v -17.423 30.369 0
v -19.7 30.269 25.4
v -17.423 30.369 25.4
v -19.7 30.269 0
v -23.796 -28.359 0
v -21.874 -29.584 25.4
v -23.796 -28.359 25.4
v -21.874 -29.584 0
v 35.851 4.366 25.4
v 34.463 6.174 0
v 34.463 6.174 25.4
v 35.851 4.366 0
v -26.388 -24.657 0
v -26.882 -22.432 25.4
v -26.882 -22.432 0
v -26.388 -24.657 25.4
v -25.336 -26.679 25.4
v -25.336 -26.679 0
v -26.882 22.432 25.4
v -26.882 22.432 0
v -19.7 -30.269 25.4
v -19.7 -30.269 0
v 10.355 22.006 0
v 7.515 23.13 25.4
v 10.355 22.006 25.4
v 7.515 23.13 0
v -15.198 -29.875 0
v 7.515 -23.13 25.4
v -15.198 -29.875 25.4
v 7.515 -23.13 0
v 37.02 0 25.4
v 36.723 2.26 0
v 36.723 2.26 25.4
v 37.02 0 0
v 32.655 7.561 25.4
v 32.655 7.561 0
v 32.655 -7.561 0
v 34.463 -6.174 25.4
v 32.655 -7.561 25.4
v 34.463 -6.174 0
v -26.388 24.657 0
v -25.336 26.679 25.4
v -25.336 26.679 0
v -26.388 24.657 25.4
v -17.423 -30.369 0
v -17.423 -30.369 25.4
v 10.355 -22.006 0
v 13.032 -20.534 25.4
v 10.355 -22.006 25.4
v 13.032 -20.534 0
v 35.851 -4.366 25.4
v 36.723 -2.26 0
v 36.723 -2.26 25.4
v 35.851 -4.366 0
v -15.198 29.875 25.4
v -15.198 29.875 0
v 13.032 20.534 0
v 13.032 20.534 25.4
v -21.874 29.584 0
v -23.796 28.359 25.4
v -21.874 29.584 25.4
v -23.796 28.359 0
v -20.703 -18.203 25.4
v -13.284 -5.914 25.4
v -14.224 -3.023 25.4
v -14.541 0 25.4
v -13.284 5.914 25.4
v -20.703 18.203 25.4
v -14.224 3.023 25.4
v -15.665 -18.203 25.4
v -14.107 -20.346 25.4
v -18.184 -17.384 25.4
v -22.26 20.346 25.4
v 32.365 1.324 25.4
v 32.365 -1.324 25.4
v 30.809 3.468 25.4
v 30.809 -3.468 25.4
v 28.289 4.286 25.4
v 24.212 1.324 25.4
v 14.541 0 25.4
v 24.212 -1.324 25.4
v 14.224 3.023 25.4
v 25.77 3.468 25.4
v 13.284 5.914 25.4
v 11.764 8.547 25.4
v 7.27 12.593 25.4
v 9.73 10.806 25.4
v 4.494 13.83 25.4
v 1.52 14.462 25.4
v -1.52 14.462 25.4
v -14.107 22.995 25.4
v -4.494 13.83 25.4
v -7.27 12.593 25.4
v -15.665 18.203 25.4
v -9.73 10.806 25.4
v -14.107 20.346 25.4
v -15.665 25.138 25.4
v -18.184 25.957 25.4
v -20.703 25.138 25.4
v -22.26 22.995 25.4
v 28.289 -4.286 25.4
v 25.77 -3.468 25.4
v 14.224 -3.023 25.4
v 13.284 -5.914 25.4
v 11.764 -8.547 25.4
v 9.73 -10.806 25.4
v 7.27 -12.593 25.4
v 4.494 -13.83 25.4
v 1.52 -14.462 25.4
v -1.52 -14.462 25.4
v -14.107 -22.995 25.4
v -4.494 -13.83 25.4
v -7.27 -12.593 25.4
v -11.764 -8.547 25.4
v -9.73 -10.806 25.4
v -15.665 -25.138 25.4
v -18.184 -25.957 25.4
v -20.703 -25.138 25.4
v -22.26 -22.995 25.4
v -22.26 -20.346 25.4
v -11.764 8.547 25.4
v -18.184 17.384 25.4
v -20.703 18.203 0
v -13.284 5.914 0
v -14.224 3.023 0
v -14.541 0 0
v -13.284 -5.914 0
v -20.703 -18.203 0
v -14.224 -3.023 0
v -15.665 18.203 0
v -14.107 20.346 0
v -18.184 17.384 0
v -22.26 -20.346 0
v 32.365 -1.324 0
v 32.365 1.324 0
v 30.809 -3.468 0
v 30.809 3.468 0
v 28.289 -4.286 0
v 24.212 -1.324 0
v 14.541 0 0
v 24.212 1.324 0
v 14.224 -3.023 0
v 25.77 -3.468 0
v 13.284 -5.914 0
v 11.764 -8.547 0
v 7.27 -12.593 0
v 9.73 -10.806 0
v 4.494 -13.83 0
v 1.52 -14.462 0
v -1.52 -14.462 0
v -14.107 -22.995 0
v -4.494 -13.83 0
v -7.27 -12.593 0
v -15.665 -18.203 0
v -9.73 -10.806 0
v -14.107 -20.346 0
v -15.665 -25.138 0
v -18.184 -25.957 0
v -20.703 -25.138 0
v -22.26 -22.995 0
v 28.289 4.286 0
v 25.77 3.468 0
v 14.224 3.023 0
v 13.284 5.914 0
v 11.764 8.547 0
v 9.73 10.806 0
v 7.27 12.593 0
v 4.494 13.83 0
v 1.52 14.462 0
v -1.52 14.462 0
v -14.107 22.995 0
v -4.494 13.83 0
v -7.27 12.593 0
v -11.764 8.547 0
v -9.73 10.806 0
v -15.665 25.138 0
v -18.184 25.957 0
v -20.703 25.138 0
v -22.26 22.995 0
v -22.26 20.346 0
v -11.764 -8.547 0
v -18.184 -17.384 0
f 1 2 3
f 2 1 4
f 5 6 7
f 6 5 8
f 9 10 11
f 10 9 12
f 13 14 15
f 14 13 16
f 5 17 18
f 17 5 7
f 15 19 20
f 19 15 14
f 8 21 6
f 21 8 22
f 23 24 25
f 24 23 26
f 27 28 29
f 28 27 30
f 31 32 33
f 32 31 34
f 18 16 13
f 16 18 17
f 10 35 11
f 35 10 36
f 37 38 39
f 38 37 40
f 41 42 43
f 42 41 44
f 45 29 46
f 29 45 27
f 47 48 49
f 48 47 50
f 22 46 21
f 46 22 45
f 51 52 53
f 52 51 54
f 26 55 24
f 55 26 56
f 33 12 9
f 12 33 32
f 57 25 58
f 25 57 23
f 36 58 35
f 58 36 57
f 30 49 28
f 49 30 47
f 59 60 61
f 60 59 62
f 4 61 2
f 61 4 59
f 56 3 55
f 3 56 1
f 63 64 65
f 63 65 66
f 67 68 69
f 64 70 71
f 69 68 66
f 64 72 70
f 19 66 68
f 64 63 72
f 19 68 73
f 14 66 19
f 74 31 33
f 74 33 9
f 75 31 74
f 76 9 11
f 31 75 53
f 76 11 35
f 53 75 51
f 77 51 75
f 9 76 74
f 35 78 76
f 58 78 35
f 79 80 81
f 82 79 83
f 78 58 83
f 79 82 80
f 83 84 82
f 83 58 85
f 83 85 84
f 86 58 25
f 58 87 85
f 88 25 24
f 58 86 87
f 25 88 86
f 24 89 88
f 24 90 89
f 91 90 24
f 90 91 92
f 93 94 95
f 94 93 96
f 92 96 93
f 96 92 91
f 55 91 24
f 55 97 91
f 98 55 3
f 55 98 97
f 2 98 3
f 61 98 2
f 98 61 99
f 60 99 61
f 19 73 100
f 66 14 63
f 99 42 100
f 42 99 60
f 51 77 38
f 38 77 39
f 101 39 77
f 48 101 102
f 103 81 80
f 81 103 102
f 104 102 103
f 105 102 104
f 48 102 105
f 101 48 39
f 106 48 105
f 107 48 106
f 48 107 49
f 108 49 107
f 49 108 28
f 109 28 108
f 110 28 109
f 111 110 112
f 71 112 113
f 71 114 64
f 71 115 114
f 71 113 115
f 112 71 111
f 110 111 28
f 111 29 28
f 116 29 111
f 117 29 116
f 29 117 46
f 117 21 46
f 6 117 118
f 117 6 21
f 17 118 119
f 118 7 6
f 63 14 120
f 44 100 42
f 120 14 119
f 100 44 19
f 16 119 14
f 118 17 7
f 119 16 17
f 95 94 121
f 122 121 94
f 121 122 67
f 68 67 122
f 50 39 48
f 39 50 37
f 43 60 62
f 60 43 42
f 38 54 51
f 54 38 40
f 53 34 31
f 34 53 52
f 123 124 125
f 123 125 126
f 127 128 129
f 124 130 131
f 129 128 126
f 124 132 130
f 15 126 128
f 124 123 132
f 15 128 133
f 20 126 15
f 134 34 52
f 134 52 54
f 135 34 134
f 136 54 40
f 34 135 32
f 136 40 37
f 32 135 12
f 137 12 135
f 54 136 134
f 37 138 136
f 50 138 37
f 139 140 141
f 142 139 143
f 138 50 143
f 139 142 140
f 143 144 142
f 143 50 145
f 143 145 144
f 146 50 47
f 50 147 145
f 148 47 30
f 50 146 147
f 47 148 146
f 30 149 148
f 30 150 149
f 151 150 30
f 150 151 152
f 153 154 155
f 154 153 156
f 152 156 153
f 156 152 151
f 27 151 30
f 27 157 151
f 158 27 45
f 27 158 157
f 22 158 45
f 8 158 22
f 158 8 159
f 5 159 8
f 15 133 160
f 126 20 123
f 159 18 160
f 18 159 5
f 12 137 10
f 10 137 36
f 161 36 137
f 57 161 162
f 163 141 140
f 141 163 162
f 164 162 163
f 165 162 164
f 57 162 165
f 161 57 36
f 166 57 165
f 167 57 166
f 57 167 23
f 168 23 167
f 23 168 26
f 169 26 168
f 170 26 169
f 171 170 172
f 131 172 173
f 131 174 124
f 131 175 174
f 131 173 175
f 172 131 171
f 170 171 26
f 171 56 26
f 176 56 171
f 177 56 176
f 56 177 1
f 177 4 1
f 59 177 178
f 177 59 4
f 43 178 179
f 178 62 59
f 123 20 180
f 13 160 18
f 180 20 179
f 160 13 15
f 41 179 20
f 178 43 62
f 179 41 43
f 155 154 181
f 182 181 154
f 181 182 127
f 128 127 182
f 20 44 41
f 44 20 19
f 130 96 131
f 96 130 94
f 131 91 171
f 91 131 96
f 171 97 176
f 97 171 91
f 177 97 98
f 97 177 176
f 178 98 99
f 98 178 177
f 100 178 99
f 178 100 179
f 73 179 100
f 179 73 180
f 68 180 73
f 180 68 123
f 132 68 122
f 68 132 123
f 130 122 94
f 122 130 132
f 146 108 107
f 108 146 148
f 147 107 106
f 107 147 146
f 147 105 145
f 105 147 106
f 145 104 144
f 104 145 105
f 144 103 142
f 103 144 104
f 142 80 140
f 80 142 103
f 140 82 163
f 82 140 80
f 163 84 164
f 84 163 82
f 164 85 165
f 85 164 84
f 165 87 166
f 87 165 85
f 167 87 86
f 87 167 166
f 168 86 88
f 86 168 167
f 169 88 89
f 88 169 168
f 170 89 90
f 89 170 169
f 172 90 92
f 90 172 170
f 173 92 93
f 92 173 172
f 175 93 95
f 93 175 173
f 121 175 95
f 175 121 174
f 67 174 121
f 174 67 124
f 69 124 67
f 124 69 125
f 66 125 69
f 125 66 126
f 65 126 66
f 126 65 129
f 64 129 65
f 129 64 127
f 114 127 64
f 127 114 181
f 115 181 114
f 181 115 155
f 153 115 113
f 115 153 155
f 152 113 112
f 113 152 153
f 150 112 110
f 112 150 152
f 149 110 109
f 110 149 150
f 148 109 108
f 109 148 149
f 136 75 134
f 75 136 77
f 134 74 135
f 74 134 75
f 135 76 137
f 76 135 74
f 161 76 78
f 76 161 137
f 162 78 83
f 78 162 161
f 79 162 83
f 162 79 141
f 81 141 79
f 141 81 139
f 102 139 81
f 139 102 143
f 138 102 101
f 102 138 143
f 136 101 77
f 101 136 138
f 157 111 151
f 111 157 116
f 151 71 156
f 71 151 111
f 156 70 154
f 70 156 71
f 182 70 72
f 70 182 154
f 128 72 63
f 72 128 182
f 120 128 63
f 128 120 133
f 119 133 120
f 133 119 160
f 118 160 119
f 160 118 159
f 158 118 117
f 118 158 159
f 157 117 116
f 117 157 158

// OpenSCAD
// file: Vitamins/Rod.scad
RodDiameter       = 1;
RodRadius         = 2;
RodClearanceSnug  = 3;
RodClearanceLoose = 4;
RodFn             = 5;

RodOneEighthInch = [
  [RodDiameter, 1/8],
  [RodRadius, 1/8/2],
  [RodClearanceSnug, 0.02],
  [RodClearanceLoose, 0.03],
  [RodFn, 8]
];

RodOneQuarterInch = [
  [RodDiameter,       1/4],
  [RodRadius,         1/4/2],
  [RodClearanceSnug,  0.027],
  [RodClearanceLoose, 0.035],
  [RodFn,             8]
];

RodFiveSixteenthInch = [
  [RodDiameter,       5/16],
  [RodRadius,         5/16/2],
  [RodClearanceSnug,  0.025],
  [RodClearanceLoose, 0.025],
  [RodFn,             10]
];

RodThreeQuarterInchTubing = [
  [RodDiameter,       0.758],
  [RodRadius,         0.758/2],
  [RodClearanceSnug,  0.023],
  [RodClearanceLoose, 0.029],
  [RodFn,             30]
];

/**
 * Lookup the diameter of a rod.
 * @param rod The rod to lookup.
 * @param clearance The RodClearance to use.
 */
function RodDiameter(rod=undef, clearance=undef)
           = lookup(RodDiameter, rod)
          + (clearance != undef ? lookup(clearance, rod) : 0);

/**
 * Lookup the radius of a rod.
 * @param rod The rod to lookup.
 * @param clearance The RodClearance to use.
 */
function RodRadius(rod, clearance=undef) = RodDiameter(rod, clearance)/2;

/**
 * Lookup the $fn value for a rod, optionally overriding it
 * @param rod The rod to lookup.
 * @param $fn Override the RodFn. If defined, this will be the result. (convenience arg)
 **/
function RodFn(rod, $fn=undef) = ($fn == undef) ? lookup(RodFn, rod) : $fn;

/**
 * A 2D rod (circle).
 * @param rod The rod to render.
 * @param clearance The RodClearance to use.
 * @param $fn Override the RodFn value of the rod.
 */
module Rod2d(rod=RodOneQuarterInch, clearance=undef, $fn=undef) {
  circle(r=RodRadius(rod, clearance),
         $fn=RodFn(rod, $fn));
}


module Rod(rod=RodOneQuarterInch, length=1, clearance=undef, center=false, $fn=undef) {
  render(convexity=1)
  linear_extrude(height=length, center=center)
  Rod2d(rod, clearance, $fn=$fn);
}

// 1/8" Rod
1_8_rod_d                = 1/8;
1_8_rod_r                = 1_8_rod_d/2;
1_8_rod_clearance        = 0.02;
1_8_rod_clearance_loose  = 0.03;

// 1/4" Rod
1_4_rod_d                = 1/4;
1_4_rod_r                = 1_4_rod_d/2;
1_4_rod_clearance        = 0.01;
1_4_rod_clearance_loose  = 0.015;
1_4_rod_collar_d         = 1/22;
1_4_rod_collar_width     = 0.27;
1_4_rod_collar_clearance = 0.0; // TODO

// 5/16" Rod
5_16_rod_d                = 5/16;
5_16_rod_r                = 5_16_rod_d/2;
5_16_rod_clearance        = 0.02; // TODO
5_16_rod_clearance_loose  = 0.02;

module rod(diameter=1, length=1, clearance=0, clearance_loose=0, loose=false, cutter=false, center=false, $fn=20) {
  clearance = loose ? clearance_loose : clearance;

  if (cutter) {
    cylinder(r=(diameter/2) + (loose ? clearance_loose : clearance), h=length, center=center);
  } else {
    cylinder(r=diameter/2, h=length, center=center);
  }
}

module 1_8_rod(length=1, loose=false, cutter=false, center=false) {
  rod(diameter=1_8_rod_d,
      clearance=1_8_rod_clearance,
      clearance_loose=1_8_rod_clearance_loose,
      length=length,
      cutter=cutter,
      center=center);
}

module 1_4_rod(length=1, loose=false, cutter=false, center=false) {
  rod(diameter=1_4_rod_d,
      clearance=1_4_rod_clearance,
      clearance_loose=1_4_rod_clearance_loose,
      loose=loose,
      length=length,
      cutter=cutter,
      center=center);
}

module 1_4_rod_collar(cutter=false) {
  rod(diameter=1_4_rod_collar_d,
      clearance=1_4_rod_collar_clearance,
      cutter=cutter,
      length=1_4_rod_collar_width);
}

module 5_16_rod(length=1, loose=false, cutter=false, center=false) {
  rod(diameter=5_16_rod_d,
      clearance=5_16_rod_clearance,
      clearance_loose=5_16_rod_clearance_loose,
      length=length,
      cutter=cutter,
      center=center);
}
// file: Math/Triangles.scad
// Pythagorean Theorem
function pyth_A_B(a,b) = sqrt(pow(a, 2) + pow(b, 2));
function pyth_A_C(a,c) = sqrt(pow(c, 2) - pow(a, 2));
function pyth_B_C(b,c) = sqrt(pow(c, 2) - pow(b, 2));

// Heron's Formula for Triangle Area
function heron_triangle_area(a,b,c) = sqrt(
    ((a+b+c)/2)
    * (((a+b+c)/2) - a)
    * (((a+b+c)/2) - b)
    * (((a+b+c)/2) - c)
  );

function heron_triangle_height(a,b,c) = 2 * heron_triangle_area(a,b,c) / c;
// file: Forend Rail.scad
include <Vitamins/Pipe.scad>;
include <Vitamins/Angle Stock.scad>;
include <Components.scad>;

function ForendRailOffset(receiverTee=receiverTee,
                          teeOverlap=tee_overlap,
                          railRod=railRod) =
      (lookup(TeeRimDiameter, receiverTee)/2) + teeOverlap
     + lookup(RodRadius, railRod);


module ForendRods(receiverTee=receiverTee, railRod=railRod,
                  clearance=undef, angles=[180,50,-50], rodFnAngle=90) {
    for (angle = angles)
    rotate([0,0,angle])
    translate([-ForendRailOffset(railRod=railRod), 0])
    rotate([0,0,-angle+rodFnAngle])
    Rod2d(rod=railRod, clearance=clearance);
}

module ForendRail(receiverTee=receiverTee, barrelPipe=barrelPipe,
                  railRod=railRod, railClearance=RodClearanceLoose,
                  wall=tee_overlap,angles=[180,50,-50]) {

  // Debugging reference
  *%TeeRim(receiverTee);

  difference() {
    hull()
    union() {
      for (angle = angles)
      rotate([0,0,angle])
      translate([-ForendRailOffset(railRod=railRod, teeOverlap=tee_overlap), 0])
      circle(r=RodRadius(railRod) + wall, $fn=24);

    }

    ForendRods(angles=angles, clearance=railClearance);
  }
}

*render(convexity=2)
linear_extrude(height=1)
ForendRail();
// file: Components.scad
include <Math/Triangles.scad>;
include <Vitamins/Angle Stock.scad>;
include <Vitamins/Pipe.scad>;
include <Vitamins/Rod.scad>;

//
// Component Dimensions
//
$fn=60;

// Fascist Settings
overall_length = 26.5;
barrel_length = 18.5;

// Configurable: Wall Thickness
tee_overlap             = 3/16;

rope_od                 = 6/32;

// Configurable: Cylinder
cylinder_spindle_diameter    = 1/8;
cylinder_spindle_wall        = 5/16;
revolver_cylinder_wall       = PipeWall(PipeOneInch);
revolver_cylinder_outer_wall = 3/64;
spindle_overlap              = revolver_cylinder_wall;
revolver_zigzag_pin_diameter = 4/32;
revolver_zigzag_depth        = 3/16;
revolver_shots               = 6;
zigzag_clearance             = 1/64;
chamber_length               = 3;
chamber_seal_overlap         = 1/4;
spindle_collar_diameter      = 0.505;
spindle_collar_height        = 0.27;
actuator_cylinder_clearance  = 0.1;

// Configurable: Vitamin Selection
railRod        = RodFiveSixteenthInch;
breechBushing  = BushingThreeQuarterInch;
barrelPipe     = TubingOnePointOneTwoFive;
stockPipe      = PipeThreeQuartersInch;
receiverTee    = TeeThreeQuarterInch;
gasSealingPipe = PipeOneInch;

// Configurable: Common Settings
bottomRailAngle = 50;

// Configurable: Forend
forend_length = 2;
forend_wall_thickness = 3/16;

// AR15 grip info
grip_width                 = 0.85;
grip_height                = 1.27;


// Calculated: Revolver Cylinder
zigzag_width = revolver_zigzag_pin_diameter + zigzag_clearance*2;
revolver_cylinder_radius = (PipeOuterDiameter(PipeThreeQuartersInch)*1.5)+revolver_cylinder_wall + revolver_cylinder_outer_wall + revolver_zigzag_depth;
revolver_cylinder_od   = revolver_cylinder_radius*2;
cylinder_circumference = 3.14 * pow(revolver_cylinder_od/2, 2);
revolver_center_offset = PipeOuterDiameter(PipeThreeQuartersInch) + revolver_cylinder_wall;
rotation_angle = 360/revolver_shots;
rotation_arc = cylinder_circumference/revolver_shots;
zigzag_height = rotation_arc/2 + revolver_zigzag_pin_diameter*2;
revolver_cylinder_height = zigzag_height + revolver_zigzag_pin_diameter*2.5;
chamber_protrusion = (chamber_length - revolver_cylinder_height)/2;

top_slot_height = revolver_zigzag_pin_diameter*2;
bottom_slot_height = revolver_zigzag_pin_diameter*2 + zigzag_clearance*1.5;
// file: Vitamins/Angle Stock.scad
AngleStockWidth                   = 1;
AngleStockThickness               = 2;
AngleStockTrough                  = 3; // Thickness across the "elbow" of the angle
AngleStockWidthClearanceSnug      = 4;
AngleStockWidthClearanceLoose     = 5;
AngleStockThicknessClearanceSnug  = 6;
AngleStockThicknessClearanceLoose = 7;
AngleStockHeight                  = 8;

// .747
// .744
// .745
//.740


//.749
//.75
AngleStockThreeQuartersByOneEighthInch = [
  [AngleStockWidth,                   0.771],
  [AngleStockThickness,               0.13],
  [AngleStockTrough,                  0.235],
  [AngleStockWidthClearanceSnug,      0.008],
  [AngleStockWidthClearanceLoose,     0.015],
  [AngleStockThicknessClearanceSnug,  0.007],
  [AngleStockThicknessClearanceLoose, 0.008],
  [AngleStockHeight,                  0.574]
];

3_4_angle_stock_width                     = 3/4;
3_4_angle_stock_thickness                 = 0.13;
3_4_angle_stock_trough                    = 0.235;
3_4_angle_stock_height                    = 0.574;
3_4_angle_stock_width_clearance           = 0.008;
3_4_angle_stock_width_clearance_loose     = 0.008;
3_4_angle_stock_thickness_clearance       = 0.005;
3_4_angle_stock_thickness_clearance_loose = 0.007;

// trough is a percentage: 0.0-1.0
module AngleStock(stock=AngleStockThreeQuartersByOneEighthInch, trough=.5, thicknessClearance=AngleStockThicknessClearanceLoose, widthClearance=AngleStockWidthClearanceLoose, length=1) {

  // A percentage of the inner-side length (width - thickness)
  clearThicknessOffset = thicknessClearance != undef ? lookup(thicknessClearance, stock) : 0;
  clearWidthOffset     = widthClearance     != undef ? lookup(widthClearance, stock)     : 0;
  troughOffset         = (trough * (lookup(AngleStockWidth, stock) - lookup(AngleStockThickness, stock))) + lookup(AngleStockThickness, stock);

  linear_extrude(height=length)
  polygon(points=[[0,0],
                  [lookup(AngleStockWidth, stock)+clearWidthOffset,0],                                                         // X-POS Outer Corner
                  [lookup(AngleStockWidth, stock)+clearWidthOffset,lookup(AngleStockThickness, stock)+clearThicknessOffset],   // X-POS Inner Corner
                  [troughOffset,lookup(AngleStockThickness, stock)+clearThicknessOffset],                                      // X-POS Trough
                  [lookup(AngleStockThickness, stock)+clearThicknessOffset,troughOffset],                                      // Y-POS Trough
                  [lookup(AngleStockThickness, stock)+clearThicknessOffset,lookup(AngleStockWidth, stock)+clearWidthOffset],   // Y-POS Inner Corner
                  [0,lookup(AngleStockWidth, stock)+clearWidthOffset],                                                         // Y-POS Outer Corner
          ],
          paths=[[0,1,2,3,4,5,6]]);
}


//#AngleStock();

module 3_4_angle_stock(length=1, cutter=false, loose=false) {
  width_clearance     = loose ? 3_4_angle_stock_width_clearance_loose     : 3_4_angle_stock_width_clearance;
  thickness_clearance = loose ? 3_4_angle_stock_thickness_clearance_loose : 3_4_angle_stock_thickness_clearance;

  union() {
    if (cutter) {
      translate([-width_clearance,-thickness_clearance,0])
      cube([3_4_angle_stock_width     + width_clearance*2,
            3_4_angle_stock_thickness + thickness_clearance*2,
            length]);

      translate([-width_clearance,-thickness_clearance,0])
      cube([3_4_angle_stock_thickness + thickness_clearance*2,
            3_4_angle_stock_width     + width_clearance*2,
            length]);

      translate([3_4_angle_stock_thickness/2, 3_4_angle_stock_thickness/2, 0])
      difference() {
        cube([3_4_angle_stock_trough + thickness_clearance/2,
              3_4_angle_stock_trough + thickness_clearance/2,
              length]);

        translate([3_4_angle_stock_trough + thickness_clearance/2,
                   thickness_clearance/2,
                   -0.1])
        rotate([0,0,45])
        cube([3_4_angle_stock_trough*sqrt(2),
              3_4_angle_stock_trough*sqrt(2),
              length + 0.2]);
      }

    } else {
      cube([3_4_angle_stock_width,3_4_angle_stock_thickness,length]);
      cube([3_4_angle_stock_thickness,3_4_angle_stock_width,length]);

      translate([3_4_angle_stock_thickness, 3_4_angle_stock_thickness, 0])
      difference() {
        cube([3_4_angle_stock_trough, 3_4_angle_stock_trough,length]);

        translate([3_4_angle_stock_trough,0,-0.1])
        rotate([0,0,45])
        cube([3_4_angle_stock_trough*sqrt(2), 3_4_angle_stock_trough*sqrt(2),length + 0.2]);
      }
    }
  };
}
// file: Vitamins/Pipe.scad
//
// Pipe dimensions
//
PipeInnerDiameter   = 1; // Inner Diameter of pipe, smallest measurement if asymmetrical
PipeOuterDiameter   = 2; // Outer Diameter of pipe, largest measurement if asymmetrical
PipeTaperedDiameter = 3; // Threads are tapered, smallest measurement if asymmetrical
PipeThreadLength    = 4; // Total length of the pipe thread
PipeThreadDepth     = 5; // Depth when fully seated
PipeClearanceSnug   = 6; // Added to the diameter, should not slip (default)
PipeClearanceLoose  = 7; // Added to the diameter, should slide freely
PipeFn              = 8; // Number of sides
PipeWeightPerUnit   = 9;

function PipeClearance(pipe, clearance)     = (clearance != undef) ? lookup(clearance, pipe) : 0;
function PipeOuterDiameter(pipe, clearance) = lookup(PipeOuterDiameter, pipe) + PipeClearance(pipe, clearance);
function PipeInnerDiameter(pipe, clearance) = lookup(PipeInnerDiameter, pipe) + PipeClearance(pipe, clearance);
function PipeOuterRadius(pipe, clearance)   = PipeOuterDiameter(pipe, clearance)/2;
function PipeInnerRadius(pipe, clearance)   = PipeInnerDiameter(pipe, clearance)/2;
function PipeWall(pipe)                     = PipeOuterRadius(pipe) - PipeInnerRadius(pipe);
function PipeFn(pipe)                       = lookup(PipeFn, pipe);

module Pipe2d(pipe, clearance=PipeClearanceSnug) {
  echo("PipeOuterRadius,PipeClearance: ", PipeOuterRadius(pipe=pipe, clearance=clearance), clearance);
  circle(r=PipeOuterRadius(pipe=pipe, clearance=PipeClearanceSnug), $fn=lookup(PipeFn, pipe));
};
module Pipe(pipe, length = 1, clearance=PipeClearanceSnug, center=false) {
  translate([0,0,center ? -length/2 : 0])
  linear_extrude(height=length)
  Pipe2d(pipe=pipe, clearance=clearance);
};

//Pipe(PipeOneInch, clearance=PipeClearanceLoose);


// 1/4" Pipe
PipeOneQuarterInch = [
  [PipeInnerDiameter,   0.265],
  [PipeOuterDiameter,   0.415],
  [PipeTaperedDiameter, 0.415], // TODO: Verify
  [PipeThreadLength,    0.5],   // TODO: Verify
  [PipeThreadDepth,     0.25],  // TODO: Verify
  [PipeClearanceSnug,   0.015], // TODO: Verify
  [PipeClearanceLoose,  0.027], // TODO: Verify
  [PipeFn,              20],
  [PipeWeightPerUnit,   0] // TODO
];

// 12GaugeChamber - 12ga Chamber tolerances are much pickier than ERW pipe
12GaugeChamber = [
  [PipeInnerDiameter,   0.78],
  [PipeFn,              30]
];

// 3/4" Pipe
PipeThreeQuartersInch = [
  [PipeInnerDiameter,   0.81],
  [PipeOuterDiameter,   1.07],
  [PipeTaperedDiameter, 1.018],
  [PipeThreadLength,    0.9],
  [PipeThreadDepth,     0.5],
  [PipeClearanceSnug,   0.005],
  [PipeClearanceLoose,  0.027],
  [PipeFn,              30],
  [PipeWeightPerUnit,   40]
];

// 1.125" DOM Tubing
TubingOnePointOneTwoFive = [
  [PipeInnerDiameter,   0.813],
  [PipeOuterDiameter,   1.125],
  [PipeTaperedDiameter, 1.018],
  [PipeThreadLength,    0.9],
  [PipeThreadDepth,     0.5],
  [PipeClearanceSnug,   0.020],
  [PipeClearanceLoose,  0.022],
  [PipeFn,              30],
  [PipeWeightPerUnit,   42]
];

// 1" Pipe
PipeOneInch = [
  [PipeInnerDiameter,   1.055],
  [PipeOuterDiameter,   1.315],
  [PipeTaperedDiameter, 1.285],
  [PipeThreadLength,    0.982],
  [PipeThreadDepth,     0.5], // TODO: Verify
  [PipeClearanceSnug,   0.02],
  [PipeClearanceLoose,  0.03],
  [PipeFn,              30],
  [PipeWeightPerUnit,   0] // TODO
];


// Fittings: Tee
TeeOuterDiameter = 1; // Diameter of the body, not the rim
TeeWidth         = 2; // Across the top of the tee, side-to-side
TeeHeight        = 3; // From the middle of the bottom rim to the top of the body
TeeInnerDiameter = 4; // Diameter of the threaded hole
TeeRimDiameter   = 5; // Diameter of the tee rim
TeeRimWidth      = 6; // Width of the tee rim
TeeInfillSphere  = 7; // Diameter of the infill sphere, cuts out the casting infill between the tee sections
TeeInfillOffset  = 8; // Offset for the infill sphere from center

TeeThreeQuarterInch = [
  [TeeOuterDiameter, 1.40],
  [TeeWidth,         2.64],
  [TeeHeight,        2.07],
  [TeeInnerDiameter, 0.88],
  [TeeRimDiameter,   1.54],
  [TeeRimWidth,      0.31],
  [TeeInfillSphere,  0.10],
  [TeeInfillOffset,  0.41]
];

function TeeOuterDiameter(tee) = lookup(TeeOuterDiameter, tee);
function TeeOuterRadius(tee)   = lookup(TeeOuterDiameter, tee)/2;
function TeeWidth(tee)         = lookup(TeeWidth, tee);
function TeeHeight(tee)        = lookup(TeeHeight, tee);
function TeeInnerDiameter(tee) = lookup(TeeInnerDiameter, tee);
function TeeInnerRadius(tee)   = lookup(TeeInnerDiameter, tee)/2;
function TeeRimDiameter(tee)   = lookup(TeeRimDiameter, tee);
function TeeRimRadius(tee)     = lookup(TeeRimDiameter, tee)/2;
function TeeRimWidth(tee)      = lookup(TeeRimWidth, tee);
function TeeCenter(tee)        = lookup(TeeHeight, tee) - TeeOuterRadius(tee);

module TeeTetris_Side(tee) {
  rotate([0,90,0])
  translate([TeeWidth(tee)/2,0,-TeeCenter(tee)])
  Tee(tee=tee);
}

module Tee(tee, $fn=40) {
   union() {

     // Top Body
     rotate([0,-90,0])
     translate([TeeHeight(tee) - (TeeOuterDiameter(tee)/2),0,0])
     cylinder(r=TeeOuterRadius(tee), h=TeeWidth(tee) * 0.99, center=true, $fn=36);

     // Bottom Body
     translate([0,0,TeeCenter(tee) * 0.01])
     cylinder(r=TeeOuterRadius(tee), h=TeeCenter(tee) * 0.98, $fn=36);

     // Bottom Rim
     cylinder(r=TeeRimRadius(tee), h=TeeRimWidth(tee), $fn=36);


    // Rims
    for (i = [1, -1]) {

      // Rim
      translate([i*TeeWidth(tee)/2,0,TeeCenter(tee)])
      rotate([0,i*-90,0]) {
      cylinder(r=TeeRimRadius(tee), h=TeeRimWidth(tee), $fn=36);

      // Casting Infill
      translate([0,0,TeeRimWidth(tee)])
      cylinder(r1=TeeRimRadius(tee),
               r2=TeeOuterRadius(tee),
                h=TeeRimWidth(tee)*1/4,
                $fn=36);
      }
    }

    // Tee Body Casting Infill
    // TODO: Tweak this? Could be better, could be worse.
    intersection() {
      translate([0,0,TeeCenter(tee) + lookup(TeeInfillSphere, tee)])
      sphere(r=TeeRimRadius(tee) + lookup(TeeInfillOffset, tee), $fn=36);

      translate([-TeeRimRadius(tee),-TeeOuterRadius(tee),0])
      cube([TeeRimDiameter(tee),TeeOuterDiameter(tee),TeeCenter(tee)]);
    }
   }
};

//Tee(TeeThreeQuarterInch);

module TeeRim(tee=TeeThreeQuarterInch, height=1, clearance=0) {
  cylinder(r=TeeRimRadius(tee) + clearance, h=height, $fn=36);
}

// Fittings: Bushings
BushingHeight    = 1;
BushingDiameter  = 2;
BushingDepth     = 3; // Bushing screws in about half an inch
BushingCapWidth  = 4;
BushingCapHeight = 5;


// 3/4" Bushing
BushingThreeQuarterInch = [
  [BushingHeight,    0.955],
  [BushingDiameter,  1.05],
  [BushingDepth,     0.49],
  [BushingCapWidth,  1.227],
  [BushingCapHeight, 0.215]
];

function BushingHeight(bushing)    = lookup(BushingHeight, bushing);
function BushingDiameter(bushing)  = lookup(BushingDiameter, bushing);
function BushingRadius(bushing)    = lookup(BushingDiameter, bushing)/2;
function BushingDepth(bushing)     = lookup(BushingDepth, bushing);
function BushingCapWidth(bushing)  = lookup(BushingCapWidth, bushing);
function BushingCapHeight(bushing) = lookup(BushingCapHeight, bushing);

module Bushing(spec=BushingThreeQuarterInch) {

  od        = lookup(BushingDiameter, spec);
  height    = lookup(BushingHeight, spec);
  capWidth  = lookup(BushingCapWidth, spec);
  capHeight = lookup(BushingCapHeight, spec);

  union() {

    // Body
    translate([0,0,capHeight/2])
    cylinder(r=BushingRadius(spec), h=height - (BushingCapHeight(spec)/2), $fn=20);

    // Head
    cylinder(r=BushingCapWidth(spec)/2, h=BushingCapHeight(spec), $fn=6);
  }
}
// main file
include <Vitamins/Pipe.scad>;
include <Vitamins/Angle Stock.scad>;
include <Components.scad>;
use     <Forend Rail.scad>;

module forend_single(wall=3/16, length=1, $fn=50,
                     receiverTee=receiverTee, barrelPipe=barrelPipe) {

  pipe_diameter    = lookup(PipeOuterDiameter, barrelPipe);
  pipe_radius      = lookup(PipeOuterDiameter, barrelPipe)/2;

  render(convexity=2)
  difference() {
    union() {
      linear_extrude(height=length)
      hull() {
        ForendRail(wall=wall);
        
        circle(r=TeeRimRadius(receiverTee)+wall);
      }
      
      *intersection() {
        translate([0,0,length/2])
        sphere(r=TeeRimRadius(receiverTee) + tee_overlap*2);
        
        translate([-2,-2,0])
        #cube([4,4,length]);
      }
    }

    linear_extrude(height=length) {
      // Barrel/Gas-Sealing Pipe Hole
      translate([0,0,-0.1])
      Pipe2d(pipe=barrelPipe, clearance=PipeClearanceSnug);
      
      ForendRods(clearance=RodClearanceLoose);
    }
  }
}

// Scale up to metric for printing
scale([25.4,25.4,25.4]) {
  forend_single();
}
